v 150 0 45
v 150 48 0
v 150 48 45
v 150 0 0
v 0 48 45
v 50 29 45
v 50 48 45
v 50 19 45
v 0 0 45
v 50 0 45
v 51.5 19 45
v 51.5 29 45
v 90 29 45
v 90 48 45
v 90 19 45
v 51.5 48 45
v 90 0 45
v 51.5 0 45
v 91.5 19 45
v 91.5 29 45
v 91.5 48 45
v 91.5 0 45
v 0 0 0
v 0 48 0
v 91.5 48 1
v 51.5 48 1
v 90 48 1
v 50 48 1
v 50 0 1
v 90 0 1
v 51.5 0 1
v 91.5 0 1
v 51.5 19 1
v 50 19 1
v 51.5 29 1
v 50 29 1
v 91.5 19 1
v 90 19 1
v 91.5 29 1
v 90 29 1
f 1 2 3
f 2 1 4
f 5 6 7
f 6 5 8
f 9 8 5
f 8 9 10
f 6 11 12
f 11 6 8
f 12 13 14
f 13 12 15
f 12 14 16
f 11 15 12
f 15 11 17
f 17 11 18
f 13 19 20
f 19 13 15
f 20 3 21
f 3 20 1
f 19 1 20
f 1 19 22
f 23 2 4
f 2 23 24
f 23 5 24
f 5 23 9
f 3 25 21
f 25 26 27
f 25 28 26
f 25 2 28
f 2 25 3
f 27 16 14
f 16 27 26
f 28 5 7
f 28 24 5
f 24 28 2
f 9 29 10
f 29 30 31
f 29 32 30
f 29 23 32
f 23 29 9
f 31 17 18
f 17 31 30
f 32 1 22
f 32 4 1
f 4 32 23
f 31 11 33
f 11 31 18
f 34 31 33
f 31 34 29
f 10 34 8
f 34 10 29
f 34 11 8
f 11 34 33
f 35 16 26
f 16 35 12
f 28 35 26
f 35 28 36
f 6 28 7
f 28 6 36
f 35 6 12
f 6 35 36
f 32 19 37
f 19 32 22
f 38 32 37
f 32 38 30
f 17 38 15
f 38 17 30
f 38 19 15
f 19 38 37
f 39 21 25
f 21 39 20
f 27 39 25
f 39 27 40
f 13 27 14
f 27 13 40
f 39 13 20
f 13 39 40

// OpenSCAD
//number of division, the total length is the sum of all n division
n=3 ;//[1:1,2:2,3:3,4:4,5:5,6:6,7:7]
// Width
L=48;
//Height
H=45;
// Space between division wall
e=10; 
// Length of the 1st division
x1=50;
// Length of the 2nd division
x2=40;
// Length of the 3rd division
x3=60;
// Length of the 4th division
x4=30;
// Length of the 5th division
x5=50;
// Length of the 6th division
x6=10;
// Length of the 7th division
x7=25;

if (n==1)
{
   total=x1; 
difference() {
    cube([total,L,H]);
}
}
if (n==2)
{
   total=x1+x2; 
difference() {
    cube([total,L,H]);
    
    translate([x1,0,1]) {
    cube([1.5,(L-e)/2,H]);
    }
    translate([x1,(L+e)/2,1]) {
    cube([1.5,(L-e)/2,H]);
    }
}
}
if (n==3)
{
   total=x1+x2+x3; 
difference() {
    cube([total,L,H]);
    
    translate([x1,0,1]) {
    cube([1.5,(L-e)/2,H]);
    }
    translate([x1,(L+e)/2,1]) {
    cube([1.5,(L-e)/2,H]);
    }
    translate([x1+x2,0,1]) {
    cube([1.5,(L-e)/2,H]);
    }
    translate([x1+x2,(L+e)/2,1]) {
    cube([1.5,(L-e)/2,H]);
    }
}}  
 if (n==4)
{
   total=x1+x2+x3+x4; 
difference() {
    cube([total,L,H]);
    
    translate([x1,0,1]) {
    cube([1.5,(L-e)/2,H]);
    }
    translate([x1,(L+e)/2,1]) {
    cube([1.5,(L-e)/2,H]);
    }
    translate([x1+x2,0,1]) {
    cube([1.5,(L-e)/2,H]);
    }
    translate([x1+x2,(L+e)/2,1]) {
    cube([1.5,(L-e)/2,H]);
    }
    translate([x1+x2+x3,0,1]) {
    cube([1.5,(L-e)/2,H]);
    }
    translate([x1+x2+x3,(L+e)/2,1]) {
    cube([1.5,(L-e)/2,H]);
    }
}}   
 if (n==5)
{
   total=x1+x2+x3+x4+x5; 
difference() {
    cube([total,L,H]);
    
    translate([x1,0,1]) {
    cube([1.5,(L-e)/2,H]);
    }
    translate([x1,(L+e)/2,1]) {
    cube([1.5,(L-e)/2,H]);
    }
    translate([x1+x2,0,1]) {
    cube([1.5,(L-e)/2,H]);
    }
    translate([x1+x2,(L+e)/2,1]) {
    cube([1.5,(L-e)/2,H]);
    }
    translate([x1+x2+x3,0,1]) {
    cube([1.5,(L-e)/2,H]);
    }
    translate([x1+x2+x3,(L+e)/2,1]) {
    cube([1.5,(L-e)/2,H]);
    }
    translate([x1+x2+x3+x4,0,1]) {
    cube([1.5,(L-e)/2,H]);
    }
    translate([x1+x2+x3+x4,(L+e)/2,1]) {
    cube([1.5,(L-e)/2,H]);
    }
}}       
 if (n==6)
{
   total=x1+x2+x3+x4+x5+x6; 
difference() {
    cube([total,L,H]);
    
    translate([x1,0,1]) {
    cube([1.5,(L-e)/2,H]);
    }
    translate([x1,(L+e)/2,1]) {
    cube([1.5,(L-e)/2,H]);
    }
    translate([x1+x2,0,1]) {
    cube([1.5,(L-e)/2,H]);
    }
    translate([x1+x2,(L+e)/2,1]) {
    cube([1.5,(L-e)/2,H]);
    }
    translate([x1+x2+x3,0,1]) {
    cube([1.5,(L-e)/2,H]);
    }
    translate([x1+x2+x3,(L+e)/2,1]) {
    cube([1.5,(L-e)/2,H]);
    }
    translate([x1+x2+x3+x4,0,1]) {
    cube([1.5,(L-e)/2,H]);
    }
    translate([x1+x2+x3+x4,(L+e)/2,1]) {
    cube([1.5,(L-e)/2,H]);
    }
    translate([x1+x2+x3+x4+x5,0,1]) {
    cube([1.5,(L-e)/2,H]);
    }
    translate([x1+x2+x3+x4+x5,(L+e)/2,1]) {
    cube([1.5,(L-e)/2,H]);
    }
}}
 if (n==7)
{
   total=x1+x2+x3+x4+x5+x6+x7; 
difference() {
    cube([total,L,H]);
    
    translate([x1,0,1]) {
    cube([1.5,(L-e)/2,H]);
    }
    translate([x1,(L+e)/2,1]) {
    cube([1.5,(L-e)/2,H]);
    }
    translate([x1+x2,0,1]) {
    cube([1.5,(L-e)/2,H]);
    }
    translate([x1+x2,(L+e)/2,1]) {
    cube([1.5,(L-e)/2,H]);
    }
    translate([x1+x2+x3,0,1]) {
    cube([1.5,(L-e)/2,H]);
    }
    translate([x1+x2+x3,(L+e)/2,1]) {
    cube([1.5,(L-e)/2,H]);
    }
    translate([x1+x2+x3+x4,0,1]) {
    cube([1.5,(L-e)/2,H]);
    }
    translate([x1+x2+x3+x4,(L+e)/2,1]) {
    cube([1.5,(L-e)/2,H]);
    }
    translate([x1+x2+x3+x4+x5,0,1]) {
    cube([1.5,(L-e)/2,H]);
    }
    translate([x1+x2+x3+x4+x5,(L+e)/2,1]) {
    cube([1.5,(L-e)/2,H]);
    }
    translate([x1+x2+x3+x4+x5+x6,0,1]) {
    cube([1.5,(L-e)/2,H]);
    }
    translate([x1+x2+x3+x4+x5+x6,(L+e)/2,1]) {
    cube([1.5,(L-e)/2,H]);
    }
}}          
